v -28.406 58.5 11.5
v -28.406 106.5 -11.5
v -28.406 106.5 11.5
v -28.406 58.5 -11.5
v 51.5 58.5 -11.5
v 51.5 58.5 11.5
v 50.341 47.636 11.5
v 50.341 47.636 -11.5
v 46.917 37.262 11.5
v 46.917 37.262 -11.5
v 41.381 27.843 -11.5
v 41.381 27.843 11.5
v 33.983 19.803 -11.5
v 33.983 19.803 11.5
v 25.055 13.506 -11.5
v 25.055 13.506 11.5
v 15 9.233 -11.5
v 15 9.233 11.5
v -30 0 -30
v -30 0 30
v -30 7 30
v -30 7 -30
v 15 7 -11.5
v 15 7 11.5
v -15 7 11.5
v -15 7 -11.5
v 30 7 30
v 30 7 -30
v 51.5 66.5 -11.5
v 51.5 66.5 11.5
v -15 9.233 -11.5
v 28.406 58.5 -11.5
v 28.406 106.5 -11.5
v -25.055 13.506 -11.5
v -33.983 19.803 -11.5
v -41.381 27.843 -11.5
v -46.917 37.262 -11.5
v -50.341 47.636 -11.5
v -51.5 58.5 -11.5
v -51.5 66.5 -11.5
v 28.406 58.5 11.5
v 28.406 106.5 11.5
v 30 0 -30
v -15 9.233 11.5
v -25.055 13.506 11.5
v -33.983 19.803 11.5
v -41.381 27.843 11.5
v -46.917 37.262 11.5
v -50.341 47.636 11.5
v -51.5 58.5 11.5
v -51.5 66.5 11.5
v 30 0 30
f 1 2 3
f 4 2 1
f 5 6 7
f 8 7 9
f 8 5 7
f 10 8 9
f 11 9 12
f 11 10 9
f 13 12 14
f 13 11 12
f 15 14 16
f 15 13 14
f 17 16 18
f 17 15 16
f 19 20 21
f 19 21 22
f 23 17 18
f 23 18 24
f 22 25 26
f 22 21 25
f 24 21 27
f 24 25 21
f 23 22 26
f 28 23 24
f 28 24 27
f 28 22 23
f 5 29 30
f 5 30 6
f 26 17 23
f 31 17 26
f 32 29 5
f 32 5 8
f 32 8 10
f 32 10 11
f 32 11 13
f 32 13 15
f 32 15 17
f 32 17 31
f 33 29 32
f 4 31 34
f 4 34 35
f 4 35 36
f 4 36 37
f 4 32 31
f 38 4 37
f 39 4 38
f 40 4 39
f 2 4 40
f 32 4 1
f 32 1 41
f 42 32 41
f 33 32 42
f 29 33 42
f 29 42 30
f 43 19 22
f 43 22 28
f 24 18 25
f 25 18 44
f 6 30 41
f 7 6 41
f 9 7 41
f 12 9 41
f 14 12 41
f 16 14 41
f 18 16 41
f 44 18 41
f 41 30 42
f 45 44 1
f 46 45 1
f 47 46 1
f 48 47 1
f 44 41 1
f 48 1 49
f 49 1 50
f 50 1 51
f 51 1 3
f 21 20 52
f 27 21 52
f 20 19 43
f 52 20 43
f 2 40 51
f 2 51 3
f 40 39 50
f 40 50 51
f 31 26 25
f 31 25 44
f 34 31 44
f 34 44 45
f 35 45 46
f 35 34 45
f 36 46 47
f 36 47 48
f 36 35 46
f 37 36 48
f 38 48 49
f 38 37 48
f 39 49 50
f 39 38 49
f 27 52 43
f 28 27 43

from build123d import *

# Parameters (mm, degrees)
SKETCH_2_W           = 60
SKETCH_2_H           = 60
EXTRUDE_1_DEPTH      = 7
EXTRUDE_2_DEPTH      = 11.5
EXTRUDE_2_DEPTH_BACK = 11.5


with BuildPart() as part:
    # 草图2 → 凸台-拉伸1 (new body)
    with BuildSketch(Plane(origin=(0, 0, 0), x_dir=(1, 0, 0), z_dir=(0, 1, 0))):
        Rectangle(SKETCH_2_W, SKETCH_2_H)
    extrude(amount=EXTRUDE_1_DEPTH)

    # 草图3 → 凸台-拉伸2 (add, two sides: drawn at the far end of the back side and taken through both)
    with BuildSketch(Plane.XY.offset(-EXTRUDE_2_DEPTH_BACK)):
        with BuildLine():
            Line((-28.405989232, 58.5), (28.405989232, 58.5))
            Line((28.405989232, 58.5), (28.405989232, 66.5))
            Line((28.405989232, 66.5), (28.405989232, 106.5))
            Line((28.405989232, 106.5), (51.5, 66.5))
            Line((51.5, 66.5), (51.5, 58.5))
            ThreePointArc((51.5, 58.5), (41.38085306, 27.842619159), (15, 9.232870999))
            Line((15, 9.232870999), (15, 7))
            Line((15, 7), (-15, 7))
            Line((-15, 7), (-15, 9.232870999))
            ThreePointArc((-15, 9.232870999), (-41.38085306, 27.842619159), (-51.5, 58.5))
            Line((-51.5, 58.5), (-51.5, 66.5))
            Line((-51.5, 66.5), (-28.405989232, 106.5))
            Line((-28.405989232, 106.5), (-28.405989232, 66.5))
            Line((-28.405989232, 66.5), (-28.405989232, 58.5))
        make_face()
    extrude(amount=EXTRUDE_2_DEPTH + EXTRUDE_2_DEPTH_BACK)


solid = part.part
